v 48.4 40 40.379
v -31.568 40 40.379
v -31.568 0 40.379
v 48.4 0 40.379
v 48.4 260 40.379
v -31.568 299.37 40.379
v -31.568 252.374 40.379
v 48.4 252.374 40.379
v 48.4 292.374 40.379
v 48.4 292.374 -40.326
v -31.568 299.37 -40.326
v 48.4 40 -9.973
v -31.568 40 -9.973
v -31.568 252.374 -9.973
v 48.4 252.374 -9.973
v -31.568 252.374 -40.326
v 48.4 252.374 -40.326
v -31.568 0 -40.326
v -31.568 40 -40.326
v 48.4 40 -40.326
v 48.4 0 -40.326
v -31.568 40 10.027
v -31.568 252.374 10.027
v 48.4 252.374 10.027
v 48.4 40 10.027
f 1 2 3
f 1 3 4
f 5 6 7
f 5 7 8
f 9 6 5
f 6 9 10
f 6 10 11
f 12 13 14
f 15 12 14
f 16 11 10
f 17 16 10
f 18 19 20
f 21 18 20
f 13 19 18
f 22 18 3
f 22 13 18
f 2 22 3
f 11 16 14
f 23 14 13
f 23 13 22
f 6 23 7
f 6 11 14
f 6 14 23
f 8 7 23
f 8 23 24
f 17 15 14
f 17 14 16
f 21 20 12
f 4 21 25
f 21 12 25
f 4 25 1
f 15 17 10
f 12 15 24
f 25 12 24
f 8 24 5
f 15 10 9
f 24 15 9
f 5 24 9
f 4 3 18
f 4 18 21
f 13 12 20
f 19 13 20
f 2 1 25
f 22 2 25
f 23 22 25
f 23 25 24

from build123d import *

# Parameters (mm, degrees)
BOSS_EXTRUDE1_START     = -40.32571447
BOSS_EXTRUDE1_DEPTH     = 80.704842411
CUT_EXTRUDE1_DEPTH      = 313.486325482
CUT_EXTRUDE1_DEPTH_BACK = 313.486325482
SKETCH2_W               = 30.352421206
SKETCH2_H               = 220
SKETCH2_W_2             = 30.352421205
SKETCH2_H_2             = 212.373598339
SKETCH5_W               = 79.968077757
SKETCH5_H               = 30.352421206
BOSS_EXTRUDE2_DEPTH     = 7.626401661


# Read off the part's stored shape, not the designer's step: Boss-Extrude1
with BuildPart() as part:
    # Boss-Extrude1 outline → Boss-Extrude1 (new body)
    with BuildSketch(Plane.XY.offset(BOSS_EXTRUDE1_START)):
        Polygon((-31.568063376, 299.369898587), (-31.568063376, 0), (48.400014381, 0), (48.400014381, 292.373598339), align=None)
    extrude(amount=BOSS_EXTRUDE1_DEPTH)

    # Sketch2 → Cut-Extrude1 (cut, two sides: drawn at the far end of the back side and taken through both)
    with BuildSketch(Plane(origin=(48.400014381, 0, 0), x_dir=(0, 0, -1), z_dir=(1, 0, 0)).offset(-CUT_EXTRUDE1_DEPTH_BACK)):
        with Locations((-25.202917338, 150)):
            Rectangle(SKETCH2_W, SKETCH2_H)
        with Locations((25.149503868, 146.18679917)):
            Rectangle(SKETCH2_W_2, SKETCH2_H_2)
    extrude(amount=CUT_EXTRUDE1_DEPTH + CUT_EXTRUDE1_DEPTH_BACK, mode=Mode.SUBTRACT)

    # Sketch5 → Boss-Extrude2 (add)
    with BuildSketch(Plane.XZ.offset(-260)):
        with Locations((8.415975503, 25.202917338)):
            Rectangle(SKETCH5_W, SKETCH5_H)
    extrude(amount=BOSS_EXTRUDE2_DEPTH)


solid = part.part
